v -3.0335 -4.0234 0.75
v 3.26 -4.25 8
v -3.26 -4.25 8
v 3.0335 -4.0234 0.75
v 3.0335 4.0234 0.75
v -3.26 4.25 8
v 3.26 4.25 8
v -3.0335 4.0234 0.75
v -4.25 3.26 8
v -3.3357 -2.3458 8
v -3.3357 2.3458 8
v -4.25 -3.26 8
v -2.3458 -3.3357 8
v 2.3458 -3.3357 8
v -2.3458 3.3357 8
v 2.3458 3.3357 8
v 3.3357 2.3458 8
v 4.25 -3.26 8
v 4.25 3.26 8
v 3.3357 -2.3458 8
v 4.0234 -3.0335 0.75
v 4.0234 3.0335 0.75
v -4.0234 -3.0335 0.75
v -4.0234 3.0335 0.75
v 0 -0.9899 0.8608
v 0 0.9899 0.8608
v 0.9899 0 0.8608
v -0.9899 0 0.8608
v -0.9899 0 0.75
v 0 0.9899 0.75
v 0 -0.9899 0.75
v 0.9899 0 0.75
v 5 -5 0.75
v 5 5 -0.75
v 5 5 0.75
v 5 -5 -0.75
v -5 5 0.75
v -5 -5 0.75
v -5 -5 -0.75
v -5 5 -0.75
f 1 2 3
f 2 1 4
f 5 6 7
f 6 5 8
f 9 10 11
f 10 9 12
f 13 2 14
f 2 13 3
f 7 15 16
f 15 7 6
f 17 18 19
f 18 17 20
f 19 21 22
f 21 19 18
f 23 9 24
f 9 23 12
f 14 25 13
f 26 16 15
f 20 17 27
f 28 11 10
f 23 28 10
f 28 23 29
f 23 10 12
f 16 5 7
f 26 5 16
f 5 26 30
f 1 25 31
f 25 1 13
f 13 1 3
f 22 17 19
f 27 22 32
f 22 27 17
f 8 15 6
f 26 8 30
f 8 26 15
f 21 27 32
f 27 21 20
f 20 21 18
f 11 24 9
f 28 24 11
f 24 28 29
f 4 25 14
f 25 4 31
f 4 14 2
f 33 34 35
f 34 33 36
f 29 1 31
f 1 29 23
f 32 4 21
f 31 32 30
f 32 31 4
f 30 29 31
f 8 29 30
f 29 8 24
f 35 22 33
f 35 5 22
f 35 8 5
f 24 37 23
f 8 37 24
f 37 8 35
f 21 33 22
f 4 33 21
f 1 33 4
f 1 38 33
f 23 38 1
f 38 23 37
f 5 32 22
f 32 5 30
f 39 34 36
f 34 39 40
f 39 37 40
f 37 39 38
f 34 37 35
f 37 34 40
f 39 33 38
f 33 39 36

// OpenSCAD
cube([10,10,1.5],center=true);

difference() {
	rotate([0,0,45]) difference() {
		union() {
			cylinder(r1=8/2*1.41421,r2=8.5/2*1.41421,h=8,$fn=4);
		}
		cylinder(r1=1,r2=7/2*1.41421,h=8.5,$fn=4);
	}
	union() {
		rotate([0,0, 0+45]) cube([20,1.4,30], center=true);
		rotate([0,0,90+45]) cube([20,1.4,30], center=true);
	}
}
